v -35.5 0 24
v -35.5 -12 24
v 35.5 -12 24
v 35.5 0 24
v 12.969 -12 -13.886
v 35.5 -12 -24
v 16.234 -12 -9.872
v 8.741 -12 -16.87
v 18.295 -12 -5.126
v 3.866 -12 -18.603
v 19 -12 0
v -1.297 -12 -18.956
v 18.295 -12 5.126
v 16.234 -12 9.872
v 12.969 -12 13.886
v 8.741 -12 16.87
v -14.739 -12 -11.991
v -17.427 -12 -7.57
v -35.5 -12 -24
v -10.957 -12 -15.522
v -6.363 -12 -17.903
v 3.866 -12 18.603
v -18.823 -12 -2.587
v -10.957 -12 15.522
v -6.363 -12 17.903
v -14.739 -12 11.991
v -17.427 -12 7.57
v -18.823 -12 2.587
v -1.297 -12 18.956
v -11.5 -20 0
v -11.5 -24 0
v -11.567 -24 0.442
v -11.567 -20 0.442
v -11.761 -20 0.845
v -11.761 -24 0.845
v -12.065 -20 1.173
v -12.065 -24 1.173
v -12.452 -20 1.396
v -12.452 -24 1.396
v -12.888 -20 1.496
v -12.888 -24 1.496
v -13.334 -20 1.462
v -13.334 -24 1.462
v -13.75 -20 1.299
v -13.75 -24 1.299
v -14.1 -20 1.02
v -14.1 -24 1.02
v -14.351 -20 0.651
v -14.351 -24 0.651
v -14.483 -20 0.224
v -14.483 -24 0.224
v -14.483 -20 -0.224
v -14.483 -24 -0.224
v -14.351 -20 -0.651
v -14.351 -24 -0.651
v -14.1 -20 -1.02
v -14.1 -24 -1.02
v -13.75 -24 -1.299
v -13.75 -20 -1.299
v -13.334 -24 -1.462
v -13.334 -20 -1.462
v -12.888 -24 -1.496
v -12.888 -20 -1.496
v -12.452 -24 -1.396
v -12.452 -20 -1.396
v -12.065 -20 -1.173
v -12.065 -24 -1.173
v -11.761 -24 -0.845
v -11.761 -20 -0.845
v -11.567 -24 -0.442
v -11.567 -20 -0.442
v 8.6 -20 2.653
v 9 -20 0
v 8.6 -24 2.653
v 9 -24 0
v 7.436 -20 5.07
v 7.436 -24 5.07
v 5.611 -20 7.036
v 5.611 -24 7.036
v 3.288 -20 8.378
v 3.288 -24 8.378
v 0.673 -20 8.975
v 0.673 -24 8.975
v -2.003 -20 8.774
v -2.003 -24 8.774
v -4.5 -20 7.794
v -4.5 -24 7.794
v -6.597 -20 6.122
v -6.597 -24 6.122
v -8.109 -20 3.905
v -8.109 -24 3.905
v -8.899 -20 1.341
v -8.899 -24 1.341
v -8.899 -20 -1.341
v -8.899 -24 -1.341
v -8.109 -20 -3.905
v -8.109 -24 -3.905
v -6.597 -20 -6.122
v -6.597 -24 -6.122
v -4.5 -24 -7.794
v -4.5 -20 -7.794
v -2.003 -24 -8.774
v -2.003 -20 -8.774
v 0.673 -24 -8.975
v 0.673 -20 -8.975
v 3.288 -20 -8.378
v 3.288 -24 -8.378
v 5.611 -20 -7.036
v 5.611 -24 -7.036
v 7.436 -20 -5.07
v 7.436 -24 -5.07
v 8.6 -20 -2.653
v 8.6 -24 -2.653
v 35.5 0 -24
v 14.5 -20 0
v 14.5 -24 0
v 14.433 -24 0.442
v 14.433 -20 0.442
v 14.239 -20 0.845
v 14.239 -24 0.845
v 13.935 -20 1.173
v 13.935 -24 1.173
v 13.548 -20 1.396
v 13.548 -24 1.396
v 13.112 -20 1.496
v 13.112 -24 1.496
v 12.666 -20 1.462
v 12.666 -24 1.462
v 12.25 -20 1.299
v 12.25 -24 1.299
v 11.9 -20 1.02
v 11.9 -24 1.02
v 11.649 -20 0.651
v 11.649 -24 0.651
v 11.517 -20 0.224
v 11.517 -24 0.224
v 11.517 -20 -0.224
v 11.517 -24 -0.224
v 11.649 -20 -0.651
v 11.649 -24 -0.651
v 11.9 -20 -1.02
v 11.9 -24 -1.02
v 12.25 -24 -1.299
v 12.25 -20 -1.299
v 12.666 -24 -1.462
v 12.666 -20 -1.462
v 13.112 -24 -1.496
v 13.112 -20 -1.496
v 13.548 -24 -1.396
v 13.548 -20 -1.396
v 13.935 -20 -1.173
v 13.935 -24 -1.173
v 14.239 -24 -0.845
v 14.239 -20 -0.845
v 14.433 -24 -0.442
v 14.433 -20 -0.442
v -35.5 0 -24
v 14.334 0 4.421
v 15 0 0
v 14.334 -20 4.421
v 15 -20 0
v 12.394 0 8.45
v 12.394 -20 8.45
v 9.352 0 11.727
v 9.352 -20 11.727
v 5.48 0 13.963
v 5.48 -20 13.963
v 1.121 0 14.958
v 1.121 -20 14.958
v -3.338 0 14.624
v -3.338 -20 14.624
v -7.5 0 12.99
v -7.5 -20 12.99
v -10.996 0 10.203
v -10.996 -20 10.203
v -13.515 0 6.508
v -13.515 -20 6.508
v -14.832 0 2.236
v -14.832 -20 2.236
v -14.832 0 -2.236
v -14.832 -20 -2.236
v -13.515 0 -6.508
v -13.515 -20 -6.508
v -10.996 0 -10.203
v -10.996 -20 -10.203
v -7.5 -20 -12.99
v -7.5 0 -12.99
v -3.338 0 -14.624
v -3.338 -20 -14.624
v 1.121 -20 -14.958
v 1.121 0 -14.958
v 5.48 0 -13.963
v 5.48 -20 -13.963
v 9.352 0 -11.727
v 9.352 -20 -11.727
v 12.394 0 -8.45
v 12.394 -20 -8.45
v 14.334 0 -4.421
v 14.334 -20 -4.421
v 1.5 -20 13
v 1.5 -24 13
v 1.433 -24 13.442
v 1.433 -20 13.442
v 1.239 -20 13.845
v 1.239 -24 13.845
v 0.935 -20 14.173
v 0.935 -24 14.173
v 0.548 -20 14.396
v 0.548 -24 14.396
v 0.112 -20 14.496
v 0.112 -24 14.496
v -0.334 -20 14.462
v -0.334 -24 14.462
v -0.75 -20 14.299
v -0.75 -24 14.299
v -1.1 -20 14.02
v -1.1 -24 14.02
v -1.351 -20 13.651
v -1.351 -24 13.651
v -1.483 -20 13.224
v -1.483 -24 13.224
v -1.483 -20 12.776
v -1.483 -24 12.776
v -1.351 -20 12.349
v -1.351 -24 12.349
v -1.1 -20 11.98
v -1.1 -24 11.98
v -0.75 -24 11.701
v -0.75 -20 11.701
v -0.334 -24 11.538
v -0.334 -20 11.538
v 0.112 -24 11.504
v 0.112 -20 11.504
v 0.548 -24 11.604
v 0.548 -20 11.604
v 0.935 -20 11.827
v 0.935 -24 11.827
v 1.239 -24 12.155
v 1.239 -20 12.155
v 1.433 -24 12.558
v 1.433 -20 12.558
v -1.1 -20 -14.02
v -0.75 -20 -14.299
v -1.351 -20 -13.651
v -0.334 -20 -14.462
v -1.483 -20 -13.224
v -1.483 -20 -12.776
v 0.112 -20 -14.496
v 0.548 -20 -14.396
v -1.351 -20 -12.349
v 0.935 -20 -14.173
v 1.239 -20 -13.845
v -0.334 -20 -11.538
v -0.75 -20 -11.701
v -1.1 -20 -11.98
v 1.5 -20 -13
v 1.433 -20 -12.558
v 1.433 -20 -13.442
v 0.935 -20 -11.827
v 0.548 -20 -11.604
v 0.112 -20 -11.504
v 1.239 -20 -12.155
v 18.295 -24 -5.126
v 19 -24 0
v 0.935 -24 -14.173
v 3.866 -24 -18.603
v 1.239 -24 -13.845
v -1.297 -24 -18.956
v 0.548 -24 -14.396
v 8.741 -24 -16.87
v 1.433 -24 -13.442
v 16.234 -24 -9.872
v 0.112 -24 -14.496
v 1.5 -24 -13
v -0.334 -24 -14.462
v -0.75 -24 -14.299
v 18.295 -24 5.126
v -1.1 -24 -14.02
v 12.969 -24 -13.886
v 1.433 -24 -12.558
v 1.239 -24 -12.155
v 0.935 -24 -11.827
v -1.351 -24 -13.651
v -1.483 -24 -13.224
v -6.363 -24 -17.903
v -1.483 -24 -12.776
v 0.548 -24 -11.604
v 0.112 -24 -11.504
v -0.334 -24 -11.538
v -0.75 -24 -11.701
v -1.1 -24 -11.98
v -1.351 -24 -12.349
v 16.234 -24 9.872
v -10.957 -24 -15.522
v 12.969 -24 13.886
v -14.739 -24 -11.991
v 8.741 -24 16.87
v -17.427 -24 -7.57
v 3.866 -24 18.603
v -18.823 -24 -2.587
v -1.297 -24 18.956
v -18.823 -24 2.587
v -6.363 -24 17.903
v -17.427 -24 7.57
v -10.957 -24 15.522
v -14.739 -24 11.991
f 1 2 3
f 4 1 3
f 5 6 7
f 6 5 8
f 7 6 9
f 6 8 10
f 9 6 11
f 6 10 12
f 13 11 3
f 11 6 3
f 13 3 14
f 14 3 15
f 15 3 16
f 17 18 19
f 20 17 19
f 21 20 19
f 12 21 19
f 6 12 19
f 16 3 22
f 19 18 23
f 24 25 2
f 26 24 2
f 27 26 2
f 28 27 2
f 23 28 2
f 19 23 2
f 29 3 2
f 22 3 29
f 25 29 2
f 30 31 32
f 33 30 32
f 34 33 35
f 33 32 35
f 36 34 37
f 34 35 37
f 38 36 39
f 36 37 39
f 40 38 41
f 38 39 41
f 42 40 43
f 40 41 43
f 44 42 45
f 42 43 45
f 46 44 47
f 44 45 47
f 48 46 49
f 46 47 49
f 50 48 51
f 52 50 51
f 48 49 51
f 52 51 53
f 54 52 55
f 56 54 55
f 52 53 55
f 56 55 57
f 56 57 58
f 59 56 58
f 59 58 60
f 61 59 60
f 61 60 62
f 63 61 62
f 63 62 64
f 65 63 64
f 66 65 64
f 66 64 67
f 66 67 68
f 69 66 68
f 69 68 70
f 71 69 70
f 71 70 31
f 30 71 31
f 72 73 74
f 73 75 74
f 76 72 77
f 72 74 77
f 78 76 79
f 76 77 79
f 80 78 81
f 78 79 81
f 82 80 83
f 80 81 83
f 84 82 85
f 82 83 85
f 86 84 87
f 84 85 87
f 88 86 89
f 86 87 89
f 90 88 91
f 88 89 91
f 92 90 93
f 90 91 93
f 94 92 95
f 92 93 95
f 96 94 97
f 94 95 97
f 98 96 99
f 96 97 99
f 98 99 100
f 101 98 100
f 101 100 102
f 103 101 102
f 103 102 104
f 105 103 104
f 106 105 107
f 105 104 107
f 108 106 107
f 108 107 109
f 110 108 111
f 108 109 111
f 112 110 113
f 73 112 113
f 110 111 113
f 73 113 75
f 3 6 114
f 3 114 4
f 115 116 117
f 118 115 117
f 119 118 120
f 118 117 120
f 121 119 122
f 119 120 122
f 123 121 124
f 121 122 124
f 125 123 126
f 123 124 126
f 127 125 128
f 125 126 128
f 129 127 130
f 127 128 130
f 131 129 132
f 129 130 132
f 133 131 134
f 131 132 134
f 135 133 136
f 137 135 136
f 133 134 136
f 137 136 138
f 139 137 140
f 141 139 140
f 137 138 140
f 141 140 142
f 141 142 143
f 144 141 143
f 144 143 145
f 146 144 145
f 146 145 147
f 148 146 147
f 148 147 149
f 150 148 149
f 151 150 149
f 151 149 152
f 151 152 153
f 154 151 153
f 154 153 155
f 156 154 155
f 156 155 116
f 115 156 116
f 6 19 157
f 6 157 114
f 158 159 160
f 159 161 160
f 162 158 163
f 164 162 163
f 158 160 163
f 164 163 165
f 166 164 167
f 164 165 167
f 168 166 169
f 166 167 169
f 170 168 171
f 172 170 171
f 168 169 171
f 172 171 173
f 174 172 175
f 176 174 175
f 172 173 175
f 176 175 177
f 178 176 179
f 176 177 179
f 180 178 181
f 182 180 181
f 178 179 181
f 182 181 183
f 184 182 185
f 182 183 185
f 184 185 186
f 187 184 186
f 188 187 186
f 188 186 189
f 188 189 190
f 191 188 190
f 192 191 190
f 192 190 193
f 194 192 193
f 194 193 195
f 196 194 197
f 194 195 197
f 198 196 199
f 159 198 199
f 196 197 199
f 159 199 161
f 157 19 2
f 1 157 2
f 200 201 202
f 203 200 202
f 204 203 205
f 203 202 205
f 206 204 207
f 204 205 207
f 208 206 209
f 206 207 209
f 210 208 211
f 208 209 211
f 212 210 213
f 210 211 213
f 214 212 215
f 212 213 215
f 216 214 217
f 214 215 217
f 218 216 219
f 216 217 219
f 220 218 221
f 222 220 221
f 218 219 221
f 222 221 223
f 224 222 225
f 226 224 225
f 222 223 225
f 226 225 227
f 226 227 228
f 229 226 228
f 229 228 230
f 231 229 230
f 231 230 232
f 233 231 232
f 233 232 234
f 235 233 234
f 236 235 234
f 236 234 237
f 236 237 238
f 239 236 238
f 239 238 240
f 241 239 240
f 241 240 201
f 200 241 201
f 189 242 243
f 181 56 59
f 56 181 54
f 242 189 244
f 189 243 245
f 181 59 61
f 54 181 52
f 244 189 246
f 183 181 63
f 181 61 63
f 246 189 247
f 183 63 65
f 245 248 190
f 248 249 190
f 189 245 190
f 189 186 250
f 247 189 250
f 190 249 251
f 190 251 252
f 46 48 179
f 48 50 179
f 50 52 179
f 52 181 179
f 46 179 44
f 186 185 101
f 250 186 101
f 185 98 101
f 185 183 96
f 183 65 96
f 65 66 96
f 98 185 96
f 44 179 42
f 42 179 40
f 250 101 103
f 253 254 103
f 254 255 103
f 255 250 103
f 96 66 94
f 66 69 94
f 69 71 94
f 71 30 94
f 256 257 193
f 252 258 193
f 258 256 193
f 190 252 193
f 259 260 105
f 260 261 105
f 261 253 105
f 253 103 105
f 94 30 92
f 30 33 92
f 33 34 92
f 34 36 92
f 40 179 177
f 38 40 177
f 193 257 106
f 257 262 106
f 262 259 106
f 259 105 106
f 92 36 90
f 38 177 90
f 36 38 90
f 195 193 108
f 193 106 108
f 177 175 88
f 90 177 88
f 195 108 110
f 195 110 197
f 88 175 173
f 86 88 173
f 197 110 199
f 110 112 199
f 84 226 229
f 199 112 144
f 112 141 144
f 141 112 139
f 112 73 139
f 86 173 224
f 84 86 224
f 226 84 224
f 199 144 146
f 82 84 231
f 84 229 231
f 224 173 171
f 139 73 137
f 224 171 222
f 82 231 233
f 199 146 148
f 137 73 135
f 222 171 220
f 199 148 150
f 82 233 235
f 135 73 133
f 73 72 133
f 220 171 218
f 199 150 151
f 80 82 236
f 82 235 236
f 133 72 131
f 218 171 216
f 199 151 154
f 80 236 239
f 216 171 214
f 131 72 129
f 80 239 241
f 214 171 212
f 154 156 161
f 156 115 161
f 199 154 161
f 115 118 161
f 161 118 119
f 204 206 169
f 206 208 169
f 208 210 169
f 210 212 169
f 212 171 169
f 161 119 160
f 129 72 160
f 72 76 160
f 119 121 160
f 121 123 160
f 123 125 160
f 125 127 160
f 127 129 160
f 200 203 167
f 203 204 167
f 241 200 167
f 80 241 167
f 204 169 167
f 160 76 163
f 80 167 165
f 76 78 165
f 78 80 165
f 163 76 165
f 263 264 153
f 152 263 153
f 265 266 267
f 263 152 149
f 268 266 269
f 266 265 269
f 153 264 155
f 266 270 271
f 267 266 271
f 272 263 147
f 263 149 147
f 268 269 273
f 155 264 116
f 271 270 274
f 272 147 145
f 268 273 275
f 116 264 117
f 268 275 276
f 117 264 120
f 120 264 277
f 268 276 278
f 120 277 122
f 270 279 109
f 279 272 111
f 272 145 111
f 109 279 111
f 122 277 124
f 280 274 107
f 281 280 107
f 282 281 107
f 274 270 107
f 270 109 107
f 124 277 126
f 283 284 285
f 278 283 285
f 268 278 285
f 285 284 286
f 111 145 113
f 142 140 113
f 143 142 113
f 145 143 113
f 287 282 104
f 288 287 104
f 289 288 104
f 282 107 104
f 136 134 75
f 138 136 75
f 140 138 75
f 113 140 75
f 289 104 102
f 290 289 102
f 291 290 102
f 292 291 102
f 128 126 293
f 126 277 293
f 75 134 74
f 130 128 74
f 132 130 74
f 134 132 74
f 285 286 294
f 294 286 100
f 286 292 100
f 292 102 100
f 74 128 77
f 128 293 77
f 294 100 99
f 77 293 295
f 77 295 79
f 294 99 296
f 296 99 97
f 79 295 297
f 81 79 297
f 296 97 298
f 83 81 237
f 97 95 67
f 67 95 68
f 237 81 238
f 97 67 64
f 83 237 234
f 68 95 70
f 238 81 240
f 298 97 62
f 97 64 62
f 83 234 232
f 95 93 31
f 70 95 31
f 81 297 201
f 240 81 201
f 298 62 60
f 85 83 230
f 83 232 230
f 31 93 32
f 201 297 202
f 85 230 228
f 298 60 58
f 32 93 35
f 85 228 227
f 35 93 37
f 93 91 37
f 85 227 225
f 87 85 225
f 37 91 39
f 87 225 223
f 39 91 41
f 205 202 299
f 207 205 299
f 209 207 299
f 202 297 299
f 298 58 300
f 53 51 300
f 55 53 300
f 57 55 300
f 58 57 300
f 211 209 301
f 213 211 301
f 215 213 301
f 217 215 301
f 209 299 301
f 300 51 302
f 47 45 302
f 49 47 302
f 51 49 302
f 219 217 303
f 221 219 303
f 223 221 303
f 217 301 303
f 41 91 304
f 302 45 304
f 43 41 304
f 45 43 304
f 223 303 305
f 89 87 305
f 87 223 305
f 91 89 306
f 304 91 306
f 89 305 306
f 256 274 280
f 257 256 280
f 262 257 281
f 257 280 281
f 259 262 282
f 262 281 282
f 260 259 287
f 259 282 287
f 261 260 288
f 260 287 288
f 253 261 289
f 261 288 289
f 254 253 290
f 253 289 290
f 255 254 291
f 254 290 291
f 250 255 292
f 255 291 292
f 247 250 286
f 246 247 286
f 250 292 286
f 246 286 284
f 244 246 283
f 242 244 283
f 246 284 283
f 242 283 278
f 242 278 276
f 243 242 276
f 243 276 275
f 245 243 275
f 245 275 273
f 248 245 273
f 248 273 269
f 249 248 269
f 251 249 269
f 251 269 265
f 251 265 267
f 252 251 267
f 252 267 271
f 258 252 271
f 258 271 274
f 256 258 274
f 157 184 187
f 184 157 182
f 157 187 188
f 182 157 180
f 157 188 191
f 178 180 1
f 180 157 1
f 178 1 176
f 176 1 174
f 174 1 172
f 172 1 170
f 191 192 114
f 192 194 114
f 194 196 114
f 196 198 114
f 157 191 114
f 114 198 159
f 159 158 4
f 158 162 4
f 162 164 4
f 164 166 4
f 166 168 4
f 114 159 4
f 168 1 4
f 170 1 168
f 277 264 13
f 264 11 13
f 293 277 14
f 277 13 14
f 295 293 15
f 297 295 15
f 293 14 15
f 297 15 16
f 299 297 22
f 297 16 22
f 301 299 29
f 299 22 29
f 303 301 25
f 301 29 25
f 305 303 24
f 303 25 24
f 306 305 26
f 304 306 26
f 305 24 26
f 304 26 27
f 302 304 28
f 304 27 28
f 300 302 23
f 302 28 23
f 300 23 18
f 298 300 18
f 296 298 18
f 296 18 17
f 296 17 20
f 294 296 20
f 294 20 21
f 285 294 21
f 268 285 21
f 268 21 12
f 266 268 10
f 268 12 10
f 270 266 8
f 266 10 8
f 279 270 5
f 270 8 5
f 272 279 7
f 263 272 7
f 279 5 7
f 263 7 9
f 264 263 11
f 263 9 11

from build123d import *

# Parameters (mm, degrees)
ESQUISSE4_R           = 1.5
EXTRUSION3_DEPTH      = 25
ESQUISSE5_OUTSIDE_W   = 153.718
ESQUISSE5_OUTSIDE_H   = 153.718
ESQUISSE5_OUTSIDE_W_2 = 71
ESQUISSE5_OUTSIDE_H_2 = 48
EXTRUSION4_DEPTH      = 13


with BuildPart() as part:
    # Esquisse1 → Révolution1 (revolve)
    with BuildSketch(Plane.XY):
        Polygon((19, -12), (59, -12), (59, 0), (15, 0), (15, -20), (9, -20), (9, -24), (19, -24), align=None)
    revolve(axis=Axis((0, 0, 0), (0, -1, 0)))

    # Esquisse4 → Extrusion3 (cut, through all)
    with BuildSketch(Plane.XZ.offset(24)):
        with Locations((0, 13)):
            Circle(ESQUISSE4_R)
        with Locations((13, 0)):
            Circle(ESQUISSE4_R)
        with Locations((0, -13)):
            Circle(ESQUISSE4_R)
        with Locations((-13, 0)):
            Circle(ESQUISSE4_R)
    extrude(amount=-EXTRUSION3_DEPTH, mode=Mode.SUBTRACT)

    # Esquisse5 outside → Extrusion4 (cut, through all)
    with BuildSketch(Plane.XZ.offset(12)):
        Rectangle(ESQUISSE5_OUTSIDE_W, ESQUISSE5_OUTSIDE_H)
        Rectangle(ESQUISSE5_OUTSIDE_W_2, ESQUISSE5_OUTSIDE_H_2, mode=Mode.SUBTRACT)
    extrude(amount=-EXTRUSION4_DEPTH, mode=Mode.SUBTRACT)


solid = part.part
